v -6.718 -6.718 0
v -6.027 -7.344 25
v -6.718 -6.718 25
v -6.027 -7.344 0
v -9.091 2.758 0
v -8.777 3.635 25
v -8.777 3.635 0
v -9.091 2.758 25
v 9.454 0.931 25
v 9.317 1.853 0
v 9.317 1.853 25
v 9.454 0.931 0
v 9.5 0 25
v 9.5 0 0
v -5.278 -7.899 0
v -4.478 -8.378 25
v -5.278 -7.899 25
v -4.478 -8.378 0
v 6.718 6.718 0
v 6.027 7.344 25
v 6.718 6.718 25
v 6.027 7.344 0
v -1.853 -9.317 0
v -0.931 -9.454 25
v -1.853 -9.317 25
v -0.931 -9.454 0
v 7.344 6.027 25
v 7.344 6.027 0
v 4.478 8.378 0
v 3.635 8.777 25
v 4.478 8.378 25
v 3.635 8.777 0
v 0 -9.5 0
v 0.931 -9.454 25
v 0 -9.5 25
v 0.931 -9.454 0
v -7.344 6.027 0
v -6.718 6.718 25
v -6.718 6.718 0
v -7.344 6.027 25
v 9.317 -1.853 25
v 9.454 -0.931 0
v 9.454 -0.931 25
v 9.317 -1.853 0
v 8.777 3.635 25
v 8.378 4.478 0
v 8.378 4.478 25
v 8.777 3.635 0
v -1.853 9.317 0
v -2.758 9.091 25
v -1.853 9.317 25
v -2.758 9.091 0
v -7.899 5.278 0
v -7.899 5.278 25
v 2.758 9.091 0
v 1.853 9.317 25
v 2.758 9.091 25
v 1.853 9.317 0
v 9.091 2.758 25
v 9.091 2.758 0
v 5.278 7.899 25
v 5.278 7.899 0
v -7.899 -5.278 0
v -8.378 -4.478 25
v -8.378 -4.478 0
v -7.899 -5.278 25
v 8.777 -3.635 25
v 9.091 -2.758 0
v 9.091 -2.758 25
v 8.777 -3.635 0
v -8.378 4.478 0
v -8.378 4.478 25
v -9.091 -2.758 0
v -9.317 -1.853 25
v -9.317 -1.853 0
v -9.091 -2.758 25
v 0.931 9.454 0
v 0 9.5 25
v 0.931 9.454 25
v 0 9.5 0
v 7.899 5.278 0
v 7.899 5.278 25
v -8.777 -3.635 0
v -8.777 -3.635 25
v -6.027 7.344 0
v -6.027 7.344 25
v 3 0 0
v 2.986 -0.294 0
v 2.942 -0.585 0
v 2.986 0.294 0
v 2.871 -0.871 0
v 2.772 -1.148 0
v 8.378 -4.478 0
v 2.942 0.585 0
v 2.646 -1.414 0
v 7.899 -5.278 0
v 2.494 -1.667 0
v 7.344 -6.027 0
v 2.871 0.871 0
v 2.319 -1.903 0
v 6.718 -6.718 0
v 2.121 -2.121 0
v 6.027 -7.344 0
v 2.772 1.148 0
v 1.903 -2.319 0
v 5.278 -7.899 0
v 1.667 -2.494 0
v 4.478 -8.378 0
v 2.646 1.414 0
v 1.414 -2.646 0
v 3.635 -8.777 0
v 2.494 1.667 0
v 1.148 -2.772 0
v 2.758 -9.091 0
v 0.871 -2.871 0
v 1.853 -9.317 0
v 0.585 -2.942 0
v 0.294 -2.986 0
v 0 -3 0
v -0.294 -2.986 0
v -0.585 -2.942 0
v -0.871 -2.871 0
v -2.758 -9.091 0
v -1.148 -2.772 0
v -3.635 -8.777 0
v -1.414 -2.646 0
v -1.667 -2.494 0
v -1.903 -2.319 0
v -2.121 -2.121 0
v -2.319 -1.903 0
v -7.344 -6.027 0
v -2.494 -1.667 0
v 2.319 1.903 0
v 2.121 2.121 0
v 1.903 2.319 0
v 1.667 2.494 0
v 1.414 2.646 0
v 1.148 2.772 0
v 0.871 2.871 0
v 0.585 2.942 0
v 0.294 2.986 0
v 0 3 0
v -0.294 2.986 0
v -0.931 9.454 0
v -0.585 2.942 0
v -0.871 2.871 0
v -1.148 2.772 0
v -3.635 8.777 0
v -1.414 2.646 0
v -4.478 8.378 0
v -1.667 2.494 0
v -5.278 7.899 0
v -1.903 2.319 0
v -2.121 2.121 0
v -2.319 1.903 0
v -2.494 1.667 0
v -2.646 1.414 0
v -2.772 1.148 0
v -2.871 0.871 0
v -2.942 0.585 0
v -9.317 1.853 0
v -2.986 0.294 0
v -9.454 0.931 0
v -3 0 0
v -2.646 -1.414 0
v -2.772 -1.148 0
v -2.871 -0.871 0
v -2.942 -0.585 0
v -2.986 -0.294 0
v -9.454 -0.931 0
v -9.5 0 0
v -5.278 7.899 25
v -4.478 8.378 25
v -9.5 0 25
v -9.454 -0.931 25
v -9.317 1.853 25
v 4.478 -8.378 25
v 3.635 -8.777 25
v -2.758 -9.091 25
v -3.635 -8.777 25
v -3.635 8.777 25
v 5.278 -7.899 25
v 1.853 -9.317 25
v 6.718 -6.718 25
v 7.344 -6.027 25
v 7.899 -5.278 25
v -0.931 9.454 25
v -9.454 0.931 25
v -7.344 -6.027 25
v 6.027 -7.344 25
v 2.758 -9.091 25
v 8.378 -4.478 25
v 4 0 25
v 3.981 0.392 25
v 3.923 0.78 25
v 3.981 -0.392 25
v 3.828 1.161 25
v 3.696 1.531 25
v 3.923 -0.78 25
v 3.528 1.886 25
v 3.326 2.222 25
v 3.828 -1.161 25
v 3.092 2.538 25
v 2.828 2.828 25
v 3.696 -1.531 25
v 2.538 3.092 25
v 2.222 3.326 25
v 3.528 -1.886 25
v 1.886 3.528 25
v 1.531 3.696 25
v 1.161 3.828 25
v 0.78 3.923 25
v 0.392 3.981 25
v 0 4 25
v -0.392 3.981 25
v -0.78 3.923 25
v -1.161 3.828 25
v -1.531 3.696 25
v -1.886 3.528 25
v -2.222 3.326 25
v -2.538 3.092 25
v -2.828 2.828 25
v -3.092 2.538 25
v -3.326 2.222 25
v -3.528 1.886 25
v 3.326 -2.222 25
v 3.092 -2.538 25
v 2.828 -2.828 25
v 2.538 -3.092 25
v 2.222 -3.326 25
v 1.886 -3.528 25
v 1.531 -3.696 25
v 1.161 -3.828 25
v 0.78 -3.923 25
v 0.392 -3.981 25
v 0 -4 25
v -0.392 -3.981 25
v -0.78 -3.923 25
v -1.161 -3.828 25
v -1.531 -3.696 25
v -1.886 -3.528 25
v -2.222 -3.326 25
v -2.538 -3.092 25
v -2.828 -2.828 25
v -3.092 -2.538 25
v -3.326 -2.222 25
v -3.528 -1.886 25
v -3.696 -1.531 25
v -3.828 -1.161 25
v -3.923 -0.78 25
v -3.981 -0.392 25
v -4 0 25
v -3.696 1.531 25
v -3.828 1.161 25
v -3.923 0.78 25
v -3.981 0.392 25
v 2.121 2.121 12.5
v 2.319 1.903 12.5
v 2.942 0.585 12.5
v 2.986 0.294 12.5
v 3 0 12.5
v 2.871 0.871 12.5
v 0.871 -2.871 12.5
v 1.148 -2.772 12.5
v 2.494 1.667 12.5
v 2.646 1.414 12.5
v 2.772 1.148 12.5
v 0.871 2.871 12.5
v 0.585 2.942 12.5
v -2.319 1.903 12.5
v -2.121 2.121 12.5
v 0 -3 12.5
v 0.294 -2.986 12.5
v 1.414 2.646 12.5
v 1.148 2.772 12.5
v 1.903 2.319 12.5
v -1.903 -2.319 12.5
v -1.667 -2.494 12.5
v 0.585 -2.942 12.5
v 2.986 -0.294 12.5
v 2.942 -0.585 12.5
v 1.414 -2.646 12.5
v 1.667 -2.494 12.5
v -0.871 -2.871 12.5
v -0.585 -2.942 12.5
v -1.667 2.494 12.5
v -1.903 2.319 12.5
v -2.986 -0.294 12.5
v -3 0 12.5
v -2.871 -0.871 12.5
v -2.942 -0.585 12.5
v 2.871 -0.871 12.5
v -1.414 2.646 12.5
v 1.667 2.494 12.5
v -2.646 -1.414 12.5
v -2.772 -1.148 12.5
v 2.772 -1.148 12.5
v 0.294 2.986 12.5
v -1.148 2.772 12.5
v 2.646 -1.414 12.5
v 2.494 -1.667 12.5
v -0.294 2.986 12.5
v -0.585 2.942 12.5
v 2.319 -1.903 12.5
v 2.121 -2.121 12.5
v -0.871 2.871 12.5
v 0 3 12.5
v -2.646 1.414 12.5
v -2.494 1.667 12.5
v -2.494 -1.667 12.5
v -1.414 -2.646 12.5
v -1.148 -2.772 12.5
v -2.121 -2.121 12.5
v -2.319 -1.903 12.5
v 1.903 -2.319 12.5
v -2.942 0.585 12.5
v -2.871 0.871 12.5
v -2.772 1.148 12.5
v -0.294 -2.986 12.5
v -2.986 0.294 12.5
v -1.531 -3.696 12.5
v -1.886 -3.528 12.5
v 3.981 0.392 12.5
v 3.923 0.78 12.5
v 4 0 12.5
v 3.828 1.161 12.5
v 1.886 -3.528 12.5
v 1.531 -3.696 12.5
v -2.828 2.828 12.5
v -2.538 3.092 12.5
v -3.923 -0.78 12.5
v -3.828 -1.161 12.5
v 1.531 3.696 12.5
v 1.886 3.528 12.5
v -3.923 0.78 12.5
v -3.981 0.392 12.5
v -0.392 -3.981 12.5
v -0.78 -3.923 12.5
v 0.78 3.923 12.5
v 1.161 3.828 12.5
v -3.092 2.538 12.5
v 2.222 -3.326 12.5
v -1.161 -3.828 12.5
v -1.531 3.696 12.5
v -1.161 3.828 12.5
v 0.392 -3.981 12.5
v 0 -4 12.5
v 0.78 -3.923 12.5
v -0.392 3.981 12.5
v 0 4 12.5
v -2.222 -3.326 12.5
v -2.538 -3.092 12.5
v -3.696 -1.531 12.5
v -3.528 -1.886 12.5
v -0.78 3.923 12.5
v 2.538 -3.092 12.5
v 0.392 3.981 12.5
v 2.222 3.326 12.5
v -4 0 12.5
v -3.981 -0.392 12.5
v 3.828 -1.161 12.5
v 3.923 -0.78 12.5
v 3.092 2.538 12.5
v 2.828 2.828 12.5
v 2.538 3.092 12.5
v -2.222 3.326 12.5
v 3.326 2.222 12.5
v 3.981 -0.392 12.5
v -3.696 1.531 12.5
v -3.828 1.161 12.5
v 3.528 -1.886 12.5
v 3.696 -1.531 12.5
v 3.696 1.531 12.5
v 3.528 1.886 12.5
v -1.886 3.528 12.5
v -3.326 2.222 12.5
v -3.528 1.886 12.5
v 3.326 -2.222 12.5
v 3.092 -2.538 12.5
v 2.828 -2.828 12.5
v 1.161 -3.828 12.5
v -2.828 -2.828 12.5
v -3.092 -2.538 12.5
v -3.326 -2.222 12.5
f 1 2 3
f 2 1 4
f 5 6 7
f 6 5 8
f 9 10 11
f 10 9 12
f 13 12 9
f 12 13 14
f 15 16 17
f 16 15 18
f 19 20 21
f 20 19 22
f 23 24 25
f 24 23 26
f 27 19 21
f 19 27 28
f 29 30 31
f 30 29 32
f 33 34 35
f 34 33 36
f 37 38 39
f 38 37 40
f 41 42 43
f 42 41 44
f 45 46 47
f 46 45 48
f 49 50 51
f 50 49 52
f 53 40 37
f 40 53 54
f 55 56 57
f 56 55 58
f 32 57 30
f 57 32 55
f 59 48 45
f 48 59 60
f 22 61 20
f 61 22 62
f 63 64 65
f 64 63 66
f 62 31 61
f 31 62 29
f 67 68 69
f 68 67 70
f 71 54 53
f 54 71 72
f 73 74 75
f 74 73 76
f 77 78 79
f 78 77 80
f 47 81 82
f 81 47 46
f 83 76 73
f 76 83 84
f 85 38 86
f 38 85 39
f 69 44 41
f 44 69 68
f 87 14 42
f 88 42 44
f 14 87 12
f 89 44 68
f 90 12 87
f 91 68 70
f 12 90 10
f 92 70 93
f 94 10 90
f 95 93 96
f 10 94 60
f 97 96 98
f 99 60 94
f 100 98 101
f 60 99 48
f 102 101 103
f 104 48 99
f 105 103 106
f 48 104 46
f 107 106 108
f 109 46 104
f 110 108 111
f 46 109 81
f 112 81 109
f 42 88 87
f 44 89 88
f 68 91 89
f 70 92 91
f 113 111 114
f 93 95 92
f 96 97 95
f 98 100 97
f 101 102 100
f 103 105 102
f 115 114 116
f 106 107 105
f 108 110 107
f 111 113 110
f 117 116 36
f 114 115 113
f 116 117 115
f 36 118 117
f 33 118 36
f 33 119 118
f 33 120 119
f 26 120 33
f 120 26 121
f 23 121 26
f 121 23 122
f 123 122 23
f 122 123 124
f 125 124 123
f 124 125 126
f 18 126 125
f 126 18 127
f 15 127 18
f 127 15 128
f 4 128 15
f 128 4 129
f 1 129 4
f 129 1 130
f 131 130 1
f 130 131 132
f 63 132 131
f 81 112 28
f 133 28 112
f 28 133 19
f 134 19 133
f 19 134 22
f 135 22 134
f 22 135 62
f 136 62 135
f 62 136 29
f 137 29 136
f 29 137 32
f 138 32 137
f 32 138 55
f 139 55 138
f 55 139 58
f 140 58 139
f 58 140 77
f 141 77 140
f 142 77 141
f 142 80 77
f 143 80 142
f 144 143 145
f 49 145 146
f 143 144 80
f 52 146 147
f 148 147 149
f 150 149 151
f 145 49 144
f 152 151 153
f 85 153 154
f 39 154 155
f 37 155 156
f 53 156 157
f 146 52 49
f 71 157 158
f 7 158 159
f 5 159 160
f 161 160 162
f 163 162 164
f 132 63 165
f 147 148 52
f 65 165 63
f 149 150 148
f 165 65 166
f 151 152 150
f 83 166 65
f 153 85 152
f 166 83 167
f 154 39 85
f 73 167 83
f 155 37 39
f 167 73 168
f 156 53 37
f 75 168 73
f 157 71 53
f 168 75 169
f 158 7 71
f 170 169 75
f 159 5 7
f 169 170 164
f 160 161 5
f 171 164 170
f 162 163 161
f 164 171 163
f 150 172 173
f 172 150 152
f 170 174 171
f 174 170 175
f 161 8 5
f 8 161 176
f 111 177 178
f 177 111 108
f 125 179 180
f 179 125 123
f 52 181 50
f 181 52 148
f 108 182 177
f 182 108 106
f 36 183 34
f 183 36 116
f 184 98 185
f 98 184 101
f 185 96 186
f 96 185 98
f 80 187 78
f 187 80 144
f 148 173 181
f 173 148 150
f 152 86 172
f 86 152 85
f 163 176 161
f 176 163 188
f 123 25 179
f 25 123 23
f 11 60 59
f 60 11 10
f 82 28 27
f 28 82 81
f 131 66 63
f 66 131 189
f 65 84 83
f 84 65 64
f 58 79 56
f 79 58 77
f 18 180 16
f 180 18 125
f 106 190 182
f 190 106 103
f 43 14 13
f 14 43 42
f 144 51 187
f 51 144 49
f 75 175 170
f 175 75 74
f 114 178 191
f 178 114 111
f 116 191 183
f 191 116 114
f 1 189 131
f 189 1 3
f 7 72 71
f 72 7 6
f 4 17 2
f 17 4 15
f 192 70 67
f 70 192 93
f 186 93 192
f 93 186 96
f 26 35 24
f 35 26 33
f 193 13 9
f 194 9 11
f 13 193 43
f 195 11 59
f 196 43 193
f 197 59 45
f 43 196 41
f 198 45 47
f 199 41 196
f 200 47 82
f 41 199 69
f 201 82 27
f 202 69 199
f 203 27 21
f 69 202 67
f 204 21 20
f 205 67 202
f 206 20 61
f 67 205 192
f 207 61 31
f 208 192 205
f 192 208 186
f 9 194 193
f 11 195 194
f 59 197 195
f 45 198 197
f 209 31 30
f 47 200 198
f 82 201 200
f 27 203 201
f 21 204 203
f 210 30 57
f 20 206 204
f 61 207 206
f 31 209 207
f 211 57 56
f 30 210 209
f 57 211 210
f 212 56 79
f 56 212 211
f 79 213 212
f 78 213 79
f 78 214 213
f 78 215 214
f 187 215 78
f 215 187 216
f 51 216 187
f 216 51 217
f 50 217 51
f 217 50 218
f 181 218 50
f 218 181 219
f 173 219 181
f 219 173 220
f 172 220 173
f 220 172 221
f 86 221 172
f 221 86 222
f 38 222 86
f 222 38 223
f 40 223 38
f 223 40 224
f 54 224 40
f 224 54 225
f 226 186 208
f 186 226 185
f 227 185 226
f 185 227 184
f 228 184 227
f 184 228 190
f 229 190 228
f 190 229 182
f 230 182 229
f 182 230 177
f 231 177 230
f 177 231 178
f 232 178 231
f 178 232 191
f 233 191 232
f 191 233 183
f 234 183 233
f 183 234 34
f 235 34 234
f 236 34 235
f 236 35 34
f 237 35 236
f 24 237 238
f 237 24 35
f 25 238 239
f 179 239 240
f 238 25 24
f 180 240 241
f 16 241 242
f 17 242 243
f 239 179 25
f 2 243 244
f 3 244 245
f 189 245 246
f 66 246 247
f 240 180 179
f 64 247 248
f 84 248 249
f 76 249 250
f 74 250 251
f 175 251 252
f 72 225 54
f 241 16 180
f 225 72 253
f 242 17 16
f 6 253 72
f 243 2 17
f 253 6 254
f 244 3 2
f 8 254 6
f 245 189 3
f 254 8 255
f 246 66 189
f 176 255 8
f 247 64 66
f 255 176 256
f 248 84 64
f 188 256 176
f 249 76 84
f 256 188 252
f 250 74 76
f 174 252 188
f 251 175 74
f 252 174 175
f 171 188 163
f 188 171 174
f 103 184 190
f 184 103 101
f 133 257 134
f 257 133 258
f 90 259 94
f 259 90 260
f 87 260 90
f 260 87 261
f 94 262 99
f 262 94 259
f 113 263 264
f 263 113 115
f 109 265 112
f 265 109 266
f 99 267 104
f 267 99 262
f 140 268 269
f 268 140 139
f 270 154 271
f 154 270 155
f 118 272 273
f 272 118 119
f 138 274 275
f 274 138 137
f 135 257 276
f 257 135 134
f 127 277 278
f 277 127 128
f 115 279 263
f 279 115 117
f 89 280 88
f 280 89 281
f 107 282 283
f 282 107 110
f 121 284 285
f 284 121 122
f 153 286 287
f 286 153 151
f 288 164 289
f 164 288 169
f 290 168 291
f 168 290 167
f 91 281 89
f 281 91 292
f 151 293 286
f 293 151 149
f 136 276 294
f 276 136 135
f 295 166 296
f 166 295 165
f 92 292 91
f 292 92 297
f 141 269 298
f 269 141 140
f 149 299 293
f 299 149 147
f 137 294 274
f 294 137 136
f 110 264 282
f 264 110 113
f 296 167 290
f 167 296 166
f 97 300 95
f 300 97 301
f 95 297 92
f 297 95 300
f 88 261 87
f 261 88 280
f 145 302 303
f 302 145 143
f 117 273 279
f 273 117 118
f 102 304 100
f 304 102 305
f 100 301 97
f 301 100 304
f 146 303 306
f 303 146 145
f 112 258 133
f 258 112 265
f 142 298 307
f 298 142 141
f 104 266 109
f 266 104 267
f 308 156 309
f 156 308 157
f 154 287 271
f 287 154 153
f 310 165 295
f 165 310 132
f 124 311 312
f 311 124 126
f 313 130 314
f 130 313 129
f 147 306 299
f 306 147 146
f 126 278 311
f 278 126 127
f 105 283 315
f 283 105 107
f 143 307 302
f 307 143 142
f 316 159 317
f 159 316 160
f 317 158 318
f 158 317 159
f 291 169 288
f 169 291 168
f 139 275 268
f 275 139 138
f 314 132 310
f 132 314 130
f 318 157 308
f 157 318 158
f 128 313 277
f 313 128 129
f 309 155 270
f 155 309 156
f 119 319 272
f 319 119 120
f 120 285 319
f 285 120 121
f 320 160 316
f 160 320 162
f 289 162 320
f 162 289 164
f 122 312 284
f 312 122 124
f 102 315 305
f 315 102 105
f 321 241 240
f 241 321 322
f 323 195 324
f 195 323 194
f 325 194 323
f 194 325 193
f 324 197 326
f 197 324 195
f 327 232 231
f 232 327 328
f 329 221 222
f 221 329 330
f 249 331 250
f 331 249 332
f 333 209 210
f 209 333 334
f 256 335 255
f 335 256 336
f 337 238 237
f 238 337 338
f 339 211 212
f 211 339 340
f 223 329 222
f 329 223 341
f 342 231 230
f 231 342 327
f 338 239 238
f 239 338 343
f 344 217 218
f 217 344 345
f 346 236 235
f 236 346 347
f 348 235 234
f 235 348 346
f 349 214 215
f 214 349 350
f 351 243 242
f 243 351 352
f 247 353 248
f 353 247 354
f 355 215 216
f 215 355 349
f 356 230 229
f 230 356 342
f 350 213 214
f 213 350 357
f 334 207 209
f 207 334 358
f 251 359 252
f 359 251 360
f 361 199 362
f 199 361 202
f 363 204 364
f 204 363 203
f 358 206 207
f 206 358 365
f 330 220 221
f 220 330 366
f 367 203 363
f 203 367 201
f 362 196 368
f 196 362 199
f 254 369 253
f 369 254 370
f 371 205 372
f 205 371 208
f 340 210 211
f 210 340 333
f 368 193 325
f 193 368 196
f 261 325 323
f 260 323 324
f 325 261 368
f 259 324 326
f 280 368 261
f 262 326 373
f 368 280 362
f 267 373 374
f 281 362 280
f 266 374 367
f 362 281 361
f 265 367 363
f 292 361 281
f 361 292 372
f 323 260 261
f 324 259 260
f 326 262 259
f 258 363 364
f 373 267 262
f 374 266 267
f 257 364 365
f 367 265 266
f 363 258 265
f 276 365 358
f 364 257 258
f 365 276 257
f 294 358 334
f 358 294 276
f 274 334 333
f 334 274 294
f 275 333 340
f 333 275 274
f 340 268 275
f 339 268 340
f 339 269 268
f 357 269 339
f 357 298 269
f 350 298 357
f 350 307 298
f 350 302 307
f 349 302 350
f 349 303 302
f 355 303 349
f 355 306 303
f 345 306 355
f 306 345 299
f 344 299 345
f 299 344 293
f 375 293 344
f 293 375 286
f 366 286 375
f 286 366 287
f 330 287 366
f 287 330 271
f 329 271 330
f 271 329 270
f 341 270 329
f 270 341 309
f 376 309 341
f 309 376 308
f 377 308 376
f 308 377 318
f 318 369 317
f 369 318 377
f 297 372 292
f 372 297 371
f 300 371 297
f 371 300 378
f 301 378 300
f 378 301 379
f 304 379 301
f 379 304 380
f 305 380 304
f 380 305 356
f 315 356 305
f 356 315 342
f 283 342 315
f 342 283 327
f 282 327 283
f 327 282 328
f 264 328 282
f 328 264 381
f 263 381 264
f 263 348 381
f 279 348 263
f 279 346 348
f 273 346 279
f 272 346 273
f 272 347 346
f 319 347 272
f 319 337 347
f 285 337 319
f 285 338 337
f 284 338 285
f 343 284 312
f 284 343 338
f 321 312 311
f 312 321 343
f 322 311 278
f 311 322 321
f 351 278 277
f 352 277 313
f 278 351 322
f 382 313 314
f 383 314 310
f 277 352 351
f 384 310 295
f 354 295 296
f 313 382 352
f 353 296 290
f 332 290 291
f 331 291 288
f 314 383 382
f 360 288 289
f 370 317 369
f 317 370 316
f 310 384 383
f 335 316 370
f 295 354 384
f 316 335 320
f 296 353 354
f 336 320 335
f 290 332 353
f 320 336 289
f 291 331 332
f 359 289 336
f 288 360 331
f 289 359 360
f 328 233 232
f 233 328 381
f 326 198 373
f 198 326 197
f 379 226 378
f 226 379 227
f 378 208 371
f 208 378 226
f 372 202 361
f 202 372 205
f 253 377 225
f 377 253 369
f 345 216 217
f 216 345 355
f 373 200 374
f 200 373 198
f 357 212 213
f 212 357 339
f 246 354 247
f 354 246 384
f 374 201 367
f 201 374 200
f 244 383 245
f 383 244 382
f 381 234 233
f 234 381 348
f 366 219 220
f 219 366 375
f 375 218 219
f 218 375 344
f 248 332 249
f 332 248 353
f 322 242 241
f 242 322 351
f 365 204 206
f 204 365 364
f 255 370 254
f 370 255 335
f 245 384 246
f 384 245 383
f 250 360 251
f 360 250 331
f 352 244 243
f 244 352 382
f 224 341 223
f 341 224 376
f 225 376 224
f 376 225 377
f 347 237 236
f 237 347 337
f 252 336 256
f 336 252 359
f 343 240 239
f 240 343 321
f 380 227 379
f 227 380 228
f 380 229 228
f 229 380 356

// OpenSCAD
module flexible_shaft_coupling() {
    difference() {
        // Outer cylinder
        cylinder(h=25.0, d=19.0, $fn=64);
        
        // 6.0mm bore
        translate([0, 0, -1])
            cylinder(h=27.0, d=6.0, $fn=64);
        
        // 8.0mm bore
        translate([0, 0, 12.5])
            cylinder(h=27.0, d=8.0, $fn=64);
    }
}

flexible_shaft_coupling();
